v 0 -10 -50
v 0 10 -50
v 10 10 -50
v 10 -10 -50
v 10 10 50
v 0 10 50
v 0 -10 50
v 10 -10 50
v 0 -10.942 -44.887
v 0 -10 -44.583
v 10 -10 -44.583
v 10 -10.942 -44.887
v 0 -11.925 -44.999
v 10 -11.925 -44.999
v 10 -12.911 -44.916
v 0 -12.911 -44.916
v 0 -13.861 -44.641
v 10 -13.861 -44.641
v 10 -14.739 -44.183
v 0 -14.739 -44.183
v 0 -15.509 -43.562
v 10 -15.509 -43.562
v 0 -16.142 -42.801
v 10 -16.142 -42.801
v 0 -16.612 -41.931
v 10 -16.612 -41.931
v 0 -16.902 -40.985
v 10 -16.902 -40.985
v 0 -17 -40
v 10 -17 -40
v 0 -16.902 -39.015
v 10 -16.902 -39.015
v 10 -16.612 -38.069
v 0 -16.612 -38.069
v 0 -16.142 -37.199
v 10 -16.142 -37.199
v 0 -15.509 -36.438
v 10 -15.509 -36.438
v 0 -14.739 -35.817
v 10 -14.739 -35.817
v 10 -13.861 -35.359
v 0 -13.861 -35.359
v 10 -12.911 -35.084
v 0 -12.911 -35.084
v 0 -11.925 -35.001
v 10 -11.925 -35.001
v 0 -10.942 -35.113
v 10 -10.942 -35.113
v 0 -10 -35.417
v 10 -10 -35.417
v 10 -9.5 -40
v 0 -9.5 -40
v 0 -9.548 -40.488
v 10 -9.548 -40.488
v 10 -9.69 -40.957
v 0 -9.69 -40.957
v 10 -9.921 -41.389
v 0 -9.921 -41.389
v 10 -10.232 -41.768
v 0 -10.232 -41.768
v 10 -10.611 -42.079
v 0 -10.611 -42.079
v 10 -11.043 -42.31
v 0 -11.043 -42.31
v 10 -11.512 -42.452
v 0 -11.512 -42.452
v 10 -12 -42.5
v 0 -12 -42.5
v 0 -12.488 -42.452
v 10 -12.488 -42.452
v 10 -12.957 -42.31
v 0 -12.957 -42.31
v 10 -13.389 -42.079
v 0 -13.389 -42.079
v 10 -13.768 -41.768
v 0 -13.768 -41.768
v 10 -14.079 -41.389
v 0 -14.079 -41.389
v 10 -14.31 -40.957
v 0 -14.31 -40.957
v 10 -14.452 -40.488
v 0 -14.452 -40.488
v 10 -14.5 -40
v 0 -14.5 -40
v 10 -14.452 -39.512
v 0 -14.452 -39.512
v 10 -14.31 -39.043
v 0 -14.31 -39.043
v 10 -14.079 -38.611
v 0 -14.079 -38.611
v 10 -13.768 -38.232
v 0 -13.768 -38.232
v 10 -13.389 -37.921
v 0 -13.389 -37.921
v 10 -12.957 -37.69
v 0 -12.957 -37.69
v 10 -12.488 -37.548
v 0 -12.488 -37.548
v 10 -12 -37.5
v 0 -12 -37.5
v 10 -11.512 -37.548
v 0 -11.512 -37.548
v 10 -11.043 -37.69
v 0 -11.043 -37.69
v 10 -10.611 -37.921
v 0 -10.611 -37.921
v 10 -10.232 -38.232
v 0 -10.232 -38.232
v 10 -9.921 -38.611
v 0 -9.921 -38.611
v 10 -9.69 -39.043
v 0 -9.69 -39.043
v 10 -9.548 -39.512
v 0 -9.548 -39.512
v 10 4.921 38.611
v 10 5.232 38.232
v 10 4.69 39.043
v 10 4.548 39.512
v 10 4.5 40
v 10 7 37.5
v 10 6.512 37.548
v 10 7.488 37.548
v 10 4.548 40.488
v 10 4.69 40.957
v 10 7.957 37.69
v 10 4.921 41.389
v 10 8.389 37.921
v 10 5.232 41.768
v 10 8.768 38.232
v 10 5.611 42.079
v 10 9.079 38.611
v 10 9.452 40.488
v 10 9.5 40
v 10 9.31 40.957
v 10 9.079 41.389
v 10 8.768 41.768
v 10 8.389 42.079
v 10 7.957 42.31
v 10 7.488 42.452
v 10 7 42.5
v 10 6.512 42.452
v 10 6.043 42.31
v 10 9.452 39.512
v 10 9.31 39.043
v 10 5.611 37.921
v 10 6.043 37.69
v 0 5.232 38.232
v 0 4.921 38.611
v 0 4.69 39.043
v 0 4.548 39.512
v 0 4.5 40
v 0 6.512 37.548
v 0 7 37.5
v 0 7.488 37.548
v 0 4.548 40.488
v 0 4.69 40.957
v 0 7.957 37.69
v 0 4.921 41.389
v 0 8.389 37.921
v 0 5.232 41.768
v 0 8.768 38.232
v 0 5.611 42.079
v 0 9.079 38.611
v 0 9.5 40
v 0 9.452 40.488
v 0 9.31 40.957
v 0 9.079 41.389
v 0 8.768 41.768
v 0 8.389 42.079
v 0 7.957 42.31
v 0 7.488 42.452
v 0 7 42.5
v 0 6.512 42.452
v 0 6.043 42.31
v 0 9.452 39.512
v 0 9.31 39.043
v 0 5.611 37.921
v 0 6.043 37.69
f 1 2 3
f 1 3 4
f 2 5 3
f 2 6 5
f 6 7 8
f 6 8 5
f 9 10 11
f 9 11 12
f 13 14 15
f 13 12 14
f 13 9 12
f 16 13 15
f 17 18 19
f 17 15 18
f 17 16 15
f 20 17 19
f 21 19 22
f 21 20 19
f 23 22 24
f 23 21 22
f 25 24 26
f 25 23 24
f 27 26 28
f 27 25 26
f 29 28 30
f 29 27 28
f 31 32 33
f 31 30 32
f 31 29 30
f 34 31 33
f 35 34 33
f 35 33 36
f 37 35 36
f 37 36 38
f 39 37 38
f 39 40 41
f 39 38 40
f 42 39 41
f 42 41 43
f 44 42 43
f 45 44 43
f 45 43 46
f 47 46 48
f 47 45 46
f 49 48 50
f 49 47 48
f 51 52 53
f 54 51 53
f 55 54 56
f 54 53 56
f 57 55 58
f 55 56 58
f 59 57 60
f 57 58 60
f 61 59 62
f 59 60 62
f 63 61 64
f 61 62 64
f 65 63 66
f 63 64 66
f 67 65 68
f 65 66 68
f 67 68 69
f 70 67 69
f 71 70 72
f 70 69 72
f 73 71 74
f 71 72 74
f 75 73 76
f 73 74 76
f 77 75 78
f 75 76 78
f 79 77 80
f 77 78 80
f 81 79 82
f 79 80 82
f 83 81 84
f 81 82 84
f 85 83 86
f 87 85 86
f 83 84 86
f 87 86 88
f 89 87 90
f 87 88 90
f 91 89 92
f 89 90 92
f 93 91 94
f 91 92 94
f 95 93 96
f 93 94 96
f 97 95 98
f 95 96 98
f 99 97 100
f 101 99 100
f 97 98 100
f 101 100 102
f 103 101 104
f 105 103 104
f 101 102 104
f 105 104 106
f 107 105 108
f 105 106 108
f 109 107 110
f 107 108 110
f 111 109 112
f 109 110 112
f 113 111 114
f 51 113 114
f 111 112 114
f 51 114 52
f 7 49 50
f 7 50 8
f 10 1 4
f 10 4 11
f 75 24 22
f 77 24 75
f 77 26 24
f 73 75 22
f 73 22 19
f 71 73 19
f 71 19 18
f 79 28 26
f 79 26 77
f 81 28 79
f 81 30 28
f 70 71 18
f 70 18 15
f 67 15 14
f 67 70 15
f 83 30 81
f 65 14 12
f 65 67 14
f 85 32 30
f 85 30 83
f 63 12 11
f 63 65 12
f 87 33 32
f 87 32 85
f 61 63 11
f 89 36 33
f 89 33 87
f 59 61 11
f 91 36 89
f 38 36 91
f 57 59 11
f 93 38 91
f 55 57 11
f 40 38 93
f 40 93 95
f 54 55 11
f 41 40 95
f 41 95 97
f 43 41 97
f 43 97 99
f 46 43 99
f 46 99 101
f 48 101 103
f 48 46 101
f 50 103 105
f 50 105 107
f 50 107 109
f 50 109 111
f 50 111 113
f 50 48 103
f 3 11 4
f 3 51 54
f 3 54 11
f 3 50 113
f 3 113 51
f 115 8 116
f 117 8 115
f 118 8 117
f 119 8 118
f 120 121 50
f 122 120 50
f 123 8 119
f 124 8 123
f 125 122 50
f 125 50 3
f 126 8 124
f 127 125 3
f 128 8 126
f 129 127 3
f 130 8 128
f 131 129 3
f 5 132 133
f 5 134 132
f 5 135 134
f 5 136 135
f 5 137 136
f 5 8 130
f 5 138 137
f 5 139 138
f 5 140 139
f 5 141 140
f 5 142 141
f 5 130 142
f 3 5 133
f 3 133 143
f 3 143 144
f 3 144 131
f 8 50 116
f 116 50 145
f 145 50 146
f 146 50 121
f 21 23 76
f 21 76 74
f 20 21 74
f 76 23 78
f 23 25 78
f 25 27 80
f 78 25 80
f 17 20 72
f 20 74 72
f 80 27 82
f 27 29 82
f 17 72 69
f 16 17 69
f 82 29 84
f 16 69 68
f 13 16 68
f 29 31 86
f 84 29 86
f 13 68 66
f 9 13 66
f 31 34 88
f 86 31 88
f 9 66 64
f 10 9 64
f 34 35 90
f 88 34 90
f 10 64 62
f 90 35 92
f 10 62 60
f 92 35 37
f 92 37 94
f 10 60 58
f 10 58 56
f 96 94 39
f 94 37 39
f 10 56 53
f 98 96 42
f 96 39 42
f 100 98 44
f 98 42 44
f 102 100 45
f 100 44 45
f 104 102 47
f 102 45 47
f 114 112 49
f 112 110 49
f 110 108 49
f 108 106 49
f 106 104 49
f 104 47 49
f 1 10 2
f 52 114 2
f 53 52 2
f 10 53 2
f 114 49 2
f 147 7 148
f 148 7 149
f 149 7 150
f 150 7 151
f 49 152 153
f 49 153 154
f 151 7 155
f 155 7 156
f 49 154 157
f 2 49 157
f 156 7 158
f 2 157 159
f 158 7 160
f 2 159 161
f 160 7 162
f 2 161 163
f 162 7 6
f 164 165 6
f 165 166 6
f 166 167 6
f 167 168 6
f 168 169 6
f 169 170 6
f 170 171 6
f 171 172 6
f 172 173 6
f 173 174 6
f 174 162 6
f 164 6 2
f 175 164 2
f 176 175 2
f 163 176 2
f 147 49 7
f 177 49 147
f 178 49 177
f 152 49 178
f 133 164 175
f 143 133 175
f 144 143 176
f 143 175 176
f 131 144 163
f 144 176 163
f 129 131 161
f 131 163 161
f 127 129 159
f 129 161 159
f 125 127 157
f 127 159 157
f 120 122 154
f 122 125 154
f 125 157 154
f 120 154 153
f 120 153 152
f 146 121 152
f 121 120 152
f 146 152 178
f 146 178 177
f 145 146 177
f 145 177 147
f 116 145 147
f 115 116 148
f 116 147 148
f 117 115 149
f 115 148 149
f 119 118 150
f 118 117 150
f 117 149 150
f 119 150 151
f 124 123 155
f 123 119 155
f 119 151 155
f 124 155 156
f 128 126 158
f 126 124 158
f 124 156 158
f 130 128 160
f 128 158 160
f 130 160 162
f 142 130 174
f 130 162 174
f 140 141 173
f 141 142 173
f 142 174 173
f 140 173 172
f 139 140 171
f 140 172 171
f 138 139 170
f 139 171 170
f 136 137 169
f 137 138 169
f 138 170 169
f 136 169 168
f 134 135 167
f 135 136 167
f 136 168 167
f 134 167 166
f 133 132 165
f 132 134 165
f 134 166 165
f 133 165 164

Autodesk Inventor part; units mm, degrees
ref_plane "YZ Plane" through (0, 0, 0) normal (1, 0, 0) x (0, 1, 0)
ref_plane "XZ Plane" through (0, 0, 0) normal (0, 1, 0) x (-1, 0, 0)
ref_plane "XY Plane" through (0, 0, 0) normal (0, 0, 1) x (1, 0, 0)
sketch "Sketch1" plane through (0, 0, 0) normal (1, 0, 0) x (0, 1, 0)
  line L0 (-10, 50) -> (10, 50)
  line L1 (10, 50) -> (10, -50)
  line L2 (10, -50) -> (-10, -50)
  line L3 (-10, -50) -> (-10, 50)
  line L4 (-10, 50) -> (10, -50) construction
  line L5 (10, 50) -> (-10, -50) construction
  circle A0 centre (7, 40) radius 2.5
  circle A1 centre (7, 40) radius 5
  circle A2 centre (-12, -40) radius 2.5
  circle A3 centre (-12, -40) radius 5
  point P0 (0, 0)
  point P1 (0, 0)
  point P2 (-10, 35.4174)
  point P3 (-10, -35.4174)
  point P4 (-10, -44.5826)
  point P5 (-10, 44.5826)
  point P6 (10, 36)
  point P7 (10, 44)
  point P8 (-10, -38.5)
  point P9 (-10, -41.5)
  dimension "d0" = 100
  dimension "d1" = 5
  dimension "d2" = 10
  dimension "d3" = 10
  dimension "d5" = 20
  dimension "d6" = 5
  dimension "d7" = 10
  dimension "d8" = 2
  dimension "d9" = 10
  dimension "d12" = 3
extrude "Extrusion1" add sketch "Sketch1" along normal blind 10 contours L0 L1 A1 L2 L3 A3 | A3 L3 A2 | L3 A2 A3 | L1 A1 picked at (9.8333, 40)
properties part number "temp-bed"
